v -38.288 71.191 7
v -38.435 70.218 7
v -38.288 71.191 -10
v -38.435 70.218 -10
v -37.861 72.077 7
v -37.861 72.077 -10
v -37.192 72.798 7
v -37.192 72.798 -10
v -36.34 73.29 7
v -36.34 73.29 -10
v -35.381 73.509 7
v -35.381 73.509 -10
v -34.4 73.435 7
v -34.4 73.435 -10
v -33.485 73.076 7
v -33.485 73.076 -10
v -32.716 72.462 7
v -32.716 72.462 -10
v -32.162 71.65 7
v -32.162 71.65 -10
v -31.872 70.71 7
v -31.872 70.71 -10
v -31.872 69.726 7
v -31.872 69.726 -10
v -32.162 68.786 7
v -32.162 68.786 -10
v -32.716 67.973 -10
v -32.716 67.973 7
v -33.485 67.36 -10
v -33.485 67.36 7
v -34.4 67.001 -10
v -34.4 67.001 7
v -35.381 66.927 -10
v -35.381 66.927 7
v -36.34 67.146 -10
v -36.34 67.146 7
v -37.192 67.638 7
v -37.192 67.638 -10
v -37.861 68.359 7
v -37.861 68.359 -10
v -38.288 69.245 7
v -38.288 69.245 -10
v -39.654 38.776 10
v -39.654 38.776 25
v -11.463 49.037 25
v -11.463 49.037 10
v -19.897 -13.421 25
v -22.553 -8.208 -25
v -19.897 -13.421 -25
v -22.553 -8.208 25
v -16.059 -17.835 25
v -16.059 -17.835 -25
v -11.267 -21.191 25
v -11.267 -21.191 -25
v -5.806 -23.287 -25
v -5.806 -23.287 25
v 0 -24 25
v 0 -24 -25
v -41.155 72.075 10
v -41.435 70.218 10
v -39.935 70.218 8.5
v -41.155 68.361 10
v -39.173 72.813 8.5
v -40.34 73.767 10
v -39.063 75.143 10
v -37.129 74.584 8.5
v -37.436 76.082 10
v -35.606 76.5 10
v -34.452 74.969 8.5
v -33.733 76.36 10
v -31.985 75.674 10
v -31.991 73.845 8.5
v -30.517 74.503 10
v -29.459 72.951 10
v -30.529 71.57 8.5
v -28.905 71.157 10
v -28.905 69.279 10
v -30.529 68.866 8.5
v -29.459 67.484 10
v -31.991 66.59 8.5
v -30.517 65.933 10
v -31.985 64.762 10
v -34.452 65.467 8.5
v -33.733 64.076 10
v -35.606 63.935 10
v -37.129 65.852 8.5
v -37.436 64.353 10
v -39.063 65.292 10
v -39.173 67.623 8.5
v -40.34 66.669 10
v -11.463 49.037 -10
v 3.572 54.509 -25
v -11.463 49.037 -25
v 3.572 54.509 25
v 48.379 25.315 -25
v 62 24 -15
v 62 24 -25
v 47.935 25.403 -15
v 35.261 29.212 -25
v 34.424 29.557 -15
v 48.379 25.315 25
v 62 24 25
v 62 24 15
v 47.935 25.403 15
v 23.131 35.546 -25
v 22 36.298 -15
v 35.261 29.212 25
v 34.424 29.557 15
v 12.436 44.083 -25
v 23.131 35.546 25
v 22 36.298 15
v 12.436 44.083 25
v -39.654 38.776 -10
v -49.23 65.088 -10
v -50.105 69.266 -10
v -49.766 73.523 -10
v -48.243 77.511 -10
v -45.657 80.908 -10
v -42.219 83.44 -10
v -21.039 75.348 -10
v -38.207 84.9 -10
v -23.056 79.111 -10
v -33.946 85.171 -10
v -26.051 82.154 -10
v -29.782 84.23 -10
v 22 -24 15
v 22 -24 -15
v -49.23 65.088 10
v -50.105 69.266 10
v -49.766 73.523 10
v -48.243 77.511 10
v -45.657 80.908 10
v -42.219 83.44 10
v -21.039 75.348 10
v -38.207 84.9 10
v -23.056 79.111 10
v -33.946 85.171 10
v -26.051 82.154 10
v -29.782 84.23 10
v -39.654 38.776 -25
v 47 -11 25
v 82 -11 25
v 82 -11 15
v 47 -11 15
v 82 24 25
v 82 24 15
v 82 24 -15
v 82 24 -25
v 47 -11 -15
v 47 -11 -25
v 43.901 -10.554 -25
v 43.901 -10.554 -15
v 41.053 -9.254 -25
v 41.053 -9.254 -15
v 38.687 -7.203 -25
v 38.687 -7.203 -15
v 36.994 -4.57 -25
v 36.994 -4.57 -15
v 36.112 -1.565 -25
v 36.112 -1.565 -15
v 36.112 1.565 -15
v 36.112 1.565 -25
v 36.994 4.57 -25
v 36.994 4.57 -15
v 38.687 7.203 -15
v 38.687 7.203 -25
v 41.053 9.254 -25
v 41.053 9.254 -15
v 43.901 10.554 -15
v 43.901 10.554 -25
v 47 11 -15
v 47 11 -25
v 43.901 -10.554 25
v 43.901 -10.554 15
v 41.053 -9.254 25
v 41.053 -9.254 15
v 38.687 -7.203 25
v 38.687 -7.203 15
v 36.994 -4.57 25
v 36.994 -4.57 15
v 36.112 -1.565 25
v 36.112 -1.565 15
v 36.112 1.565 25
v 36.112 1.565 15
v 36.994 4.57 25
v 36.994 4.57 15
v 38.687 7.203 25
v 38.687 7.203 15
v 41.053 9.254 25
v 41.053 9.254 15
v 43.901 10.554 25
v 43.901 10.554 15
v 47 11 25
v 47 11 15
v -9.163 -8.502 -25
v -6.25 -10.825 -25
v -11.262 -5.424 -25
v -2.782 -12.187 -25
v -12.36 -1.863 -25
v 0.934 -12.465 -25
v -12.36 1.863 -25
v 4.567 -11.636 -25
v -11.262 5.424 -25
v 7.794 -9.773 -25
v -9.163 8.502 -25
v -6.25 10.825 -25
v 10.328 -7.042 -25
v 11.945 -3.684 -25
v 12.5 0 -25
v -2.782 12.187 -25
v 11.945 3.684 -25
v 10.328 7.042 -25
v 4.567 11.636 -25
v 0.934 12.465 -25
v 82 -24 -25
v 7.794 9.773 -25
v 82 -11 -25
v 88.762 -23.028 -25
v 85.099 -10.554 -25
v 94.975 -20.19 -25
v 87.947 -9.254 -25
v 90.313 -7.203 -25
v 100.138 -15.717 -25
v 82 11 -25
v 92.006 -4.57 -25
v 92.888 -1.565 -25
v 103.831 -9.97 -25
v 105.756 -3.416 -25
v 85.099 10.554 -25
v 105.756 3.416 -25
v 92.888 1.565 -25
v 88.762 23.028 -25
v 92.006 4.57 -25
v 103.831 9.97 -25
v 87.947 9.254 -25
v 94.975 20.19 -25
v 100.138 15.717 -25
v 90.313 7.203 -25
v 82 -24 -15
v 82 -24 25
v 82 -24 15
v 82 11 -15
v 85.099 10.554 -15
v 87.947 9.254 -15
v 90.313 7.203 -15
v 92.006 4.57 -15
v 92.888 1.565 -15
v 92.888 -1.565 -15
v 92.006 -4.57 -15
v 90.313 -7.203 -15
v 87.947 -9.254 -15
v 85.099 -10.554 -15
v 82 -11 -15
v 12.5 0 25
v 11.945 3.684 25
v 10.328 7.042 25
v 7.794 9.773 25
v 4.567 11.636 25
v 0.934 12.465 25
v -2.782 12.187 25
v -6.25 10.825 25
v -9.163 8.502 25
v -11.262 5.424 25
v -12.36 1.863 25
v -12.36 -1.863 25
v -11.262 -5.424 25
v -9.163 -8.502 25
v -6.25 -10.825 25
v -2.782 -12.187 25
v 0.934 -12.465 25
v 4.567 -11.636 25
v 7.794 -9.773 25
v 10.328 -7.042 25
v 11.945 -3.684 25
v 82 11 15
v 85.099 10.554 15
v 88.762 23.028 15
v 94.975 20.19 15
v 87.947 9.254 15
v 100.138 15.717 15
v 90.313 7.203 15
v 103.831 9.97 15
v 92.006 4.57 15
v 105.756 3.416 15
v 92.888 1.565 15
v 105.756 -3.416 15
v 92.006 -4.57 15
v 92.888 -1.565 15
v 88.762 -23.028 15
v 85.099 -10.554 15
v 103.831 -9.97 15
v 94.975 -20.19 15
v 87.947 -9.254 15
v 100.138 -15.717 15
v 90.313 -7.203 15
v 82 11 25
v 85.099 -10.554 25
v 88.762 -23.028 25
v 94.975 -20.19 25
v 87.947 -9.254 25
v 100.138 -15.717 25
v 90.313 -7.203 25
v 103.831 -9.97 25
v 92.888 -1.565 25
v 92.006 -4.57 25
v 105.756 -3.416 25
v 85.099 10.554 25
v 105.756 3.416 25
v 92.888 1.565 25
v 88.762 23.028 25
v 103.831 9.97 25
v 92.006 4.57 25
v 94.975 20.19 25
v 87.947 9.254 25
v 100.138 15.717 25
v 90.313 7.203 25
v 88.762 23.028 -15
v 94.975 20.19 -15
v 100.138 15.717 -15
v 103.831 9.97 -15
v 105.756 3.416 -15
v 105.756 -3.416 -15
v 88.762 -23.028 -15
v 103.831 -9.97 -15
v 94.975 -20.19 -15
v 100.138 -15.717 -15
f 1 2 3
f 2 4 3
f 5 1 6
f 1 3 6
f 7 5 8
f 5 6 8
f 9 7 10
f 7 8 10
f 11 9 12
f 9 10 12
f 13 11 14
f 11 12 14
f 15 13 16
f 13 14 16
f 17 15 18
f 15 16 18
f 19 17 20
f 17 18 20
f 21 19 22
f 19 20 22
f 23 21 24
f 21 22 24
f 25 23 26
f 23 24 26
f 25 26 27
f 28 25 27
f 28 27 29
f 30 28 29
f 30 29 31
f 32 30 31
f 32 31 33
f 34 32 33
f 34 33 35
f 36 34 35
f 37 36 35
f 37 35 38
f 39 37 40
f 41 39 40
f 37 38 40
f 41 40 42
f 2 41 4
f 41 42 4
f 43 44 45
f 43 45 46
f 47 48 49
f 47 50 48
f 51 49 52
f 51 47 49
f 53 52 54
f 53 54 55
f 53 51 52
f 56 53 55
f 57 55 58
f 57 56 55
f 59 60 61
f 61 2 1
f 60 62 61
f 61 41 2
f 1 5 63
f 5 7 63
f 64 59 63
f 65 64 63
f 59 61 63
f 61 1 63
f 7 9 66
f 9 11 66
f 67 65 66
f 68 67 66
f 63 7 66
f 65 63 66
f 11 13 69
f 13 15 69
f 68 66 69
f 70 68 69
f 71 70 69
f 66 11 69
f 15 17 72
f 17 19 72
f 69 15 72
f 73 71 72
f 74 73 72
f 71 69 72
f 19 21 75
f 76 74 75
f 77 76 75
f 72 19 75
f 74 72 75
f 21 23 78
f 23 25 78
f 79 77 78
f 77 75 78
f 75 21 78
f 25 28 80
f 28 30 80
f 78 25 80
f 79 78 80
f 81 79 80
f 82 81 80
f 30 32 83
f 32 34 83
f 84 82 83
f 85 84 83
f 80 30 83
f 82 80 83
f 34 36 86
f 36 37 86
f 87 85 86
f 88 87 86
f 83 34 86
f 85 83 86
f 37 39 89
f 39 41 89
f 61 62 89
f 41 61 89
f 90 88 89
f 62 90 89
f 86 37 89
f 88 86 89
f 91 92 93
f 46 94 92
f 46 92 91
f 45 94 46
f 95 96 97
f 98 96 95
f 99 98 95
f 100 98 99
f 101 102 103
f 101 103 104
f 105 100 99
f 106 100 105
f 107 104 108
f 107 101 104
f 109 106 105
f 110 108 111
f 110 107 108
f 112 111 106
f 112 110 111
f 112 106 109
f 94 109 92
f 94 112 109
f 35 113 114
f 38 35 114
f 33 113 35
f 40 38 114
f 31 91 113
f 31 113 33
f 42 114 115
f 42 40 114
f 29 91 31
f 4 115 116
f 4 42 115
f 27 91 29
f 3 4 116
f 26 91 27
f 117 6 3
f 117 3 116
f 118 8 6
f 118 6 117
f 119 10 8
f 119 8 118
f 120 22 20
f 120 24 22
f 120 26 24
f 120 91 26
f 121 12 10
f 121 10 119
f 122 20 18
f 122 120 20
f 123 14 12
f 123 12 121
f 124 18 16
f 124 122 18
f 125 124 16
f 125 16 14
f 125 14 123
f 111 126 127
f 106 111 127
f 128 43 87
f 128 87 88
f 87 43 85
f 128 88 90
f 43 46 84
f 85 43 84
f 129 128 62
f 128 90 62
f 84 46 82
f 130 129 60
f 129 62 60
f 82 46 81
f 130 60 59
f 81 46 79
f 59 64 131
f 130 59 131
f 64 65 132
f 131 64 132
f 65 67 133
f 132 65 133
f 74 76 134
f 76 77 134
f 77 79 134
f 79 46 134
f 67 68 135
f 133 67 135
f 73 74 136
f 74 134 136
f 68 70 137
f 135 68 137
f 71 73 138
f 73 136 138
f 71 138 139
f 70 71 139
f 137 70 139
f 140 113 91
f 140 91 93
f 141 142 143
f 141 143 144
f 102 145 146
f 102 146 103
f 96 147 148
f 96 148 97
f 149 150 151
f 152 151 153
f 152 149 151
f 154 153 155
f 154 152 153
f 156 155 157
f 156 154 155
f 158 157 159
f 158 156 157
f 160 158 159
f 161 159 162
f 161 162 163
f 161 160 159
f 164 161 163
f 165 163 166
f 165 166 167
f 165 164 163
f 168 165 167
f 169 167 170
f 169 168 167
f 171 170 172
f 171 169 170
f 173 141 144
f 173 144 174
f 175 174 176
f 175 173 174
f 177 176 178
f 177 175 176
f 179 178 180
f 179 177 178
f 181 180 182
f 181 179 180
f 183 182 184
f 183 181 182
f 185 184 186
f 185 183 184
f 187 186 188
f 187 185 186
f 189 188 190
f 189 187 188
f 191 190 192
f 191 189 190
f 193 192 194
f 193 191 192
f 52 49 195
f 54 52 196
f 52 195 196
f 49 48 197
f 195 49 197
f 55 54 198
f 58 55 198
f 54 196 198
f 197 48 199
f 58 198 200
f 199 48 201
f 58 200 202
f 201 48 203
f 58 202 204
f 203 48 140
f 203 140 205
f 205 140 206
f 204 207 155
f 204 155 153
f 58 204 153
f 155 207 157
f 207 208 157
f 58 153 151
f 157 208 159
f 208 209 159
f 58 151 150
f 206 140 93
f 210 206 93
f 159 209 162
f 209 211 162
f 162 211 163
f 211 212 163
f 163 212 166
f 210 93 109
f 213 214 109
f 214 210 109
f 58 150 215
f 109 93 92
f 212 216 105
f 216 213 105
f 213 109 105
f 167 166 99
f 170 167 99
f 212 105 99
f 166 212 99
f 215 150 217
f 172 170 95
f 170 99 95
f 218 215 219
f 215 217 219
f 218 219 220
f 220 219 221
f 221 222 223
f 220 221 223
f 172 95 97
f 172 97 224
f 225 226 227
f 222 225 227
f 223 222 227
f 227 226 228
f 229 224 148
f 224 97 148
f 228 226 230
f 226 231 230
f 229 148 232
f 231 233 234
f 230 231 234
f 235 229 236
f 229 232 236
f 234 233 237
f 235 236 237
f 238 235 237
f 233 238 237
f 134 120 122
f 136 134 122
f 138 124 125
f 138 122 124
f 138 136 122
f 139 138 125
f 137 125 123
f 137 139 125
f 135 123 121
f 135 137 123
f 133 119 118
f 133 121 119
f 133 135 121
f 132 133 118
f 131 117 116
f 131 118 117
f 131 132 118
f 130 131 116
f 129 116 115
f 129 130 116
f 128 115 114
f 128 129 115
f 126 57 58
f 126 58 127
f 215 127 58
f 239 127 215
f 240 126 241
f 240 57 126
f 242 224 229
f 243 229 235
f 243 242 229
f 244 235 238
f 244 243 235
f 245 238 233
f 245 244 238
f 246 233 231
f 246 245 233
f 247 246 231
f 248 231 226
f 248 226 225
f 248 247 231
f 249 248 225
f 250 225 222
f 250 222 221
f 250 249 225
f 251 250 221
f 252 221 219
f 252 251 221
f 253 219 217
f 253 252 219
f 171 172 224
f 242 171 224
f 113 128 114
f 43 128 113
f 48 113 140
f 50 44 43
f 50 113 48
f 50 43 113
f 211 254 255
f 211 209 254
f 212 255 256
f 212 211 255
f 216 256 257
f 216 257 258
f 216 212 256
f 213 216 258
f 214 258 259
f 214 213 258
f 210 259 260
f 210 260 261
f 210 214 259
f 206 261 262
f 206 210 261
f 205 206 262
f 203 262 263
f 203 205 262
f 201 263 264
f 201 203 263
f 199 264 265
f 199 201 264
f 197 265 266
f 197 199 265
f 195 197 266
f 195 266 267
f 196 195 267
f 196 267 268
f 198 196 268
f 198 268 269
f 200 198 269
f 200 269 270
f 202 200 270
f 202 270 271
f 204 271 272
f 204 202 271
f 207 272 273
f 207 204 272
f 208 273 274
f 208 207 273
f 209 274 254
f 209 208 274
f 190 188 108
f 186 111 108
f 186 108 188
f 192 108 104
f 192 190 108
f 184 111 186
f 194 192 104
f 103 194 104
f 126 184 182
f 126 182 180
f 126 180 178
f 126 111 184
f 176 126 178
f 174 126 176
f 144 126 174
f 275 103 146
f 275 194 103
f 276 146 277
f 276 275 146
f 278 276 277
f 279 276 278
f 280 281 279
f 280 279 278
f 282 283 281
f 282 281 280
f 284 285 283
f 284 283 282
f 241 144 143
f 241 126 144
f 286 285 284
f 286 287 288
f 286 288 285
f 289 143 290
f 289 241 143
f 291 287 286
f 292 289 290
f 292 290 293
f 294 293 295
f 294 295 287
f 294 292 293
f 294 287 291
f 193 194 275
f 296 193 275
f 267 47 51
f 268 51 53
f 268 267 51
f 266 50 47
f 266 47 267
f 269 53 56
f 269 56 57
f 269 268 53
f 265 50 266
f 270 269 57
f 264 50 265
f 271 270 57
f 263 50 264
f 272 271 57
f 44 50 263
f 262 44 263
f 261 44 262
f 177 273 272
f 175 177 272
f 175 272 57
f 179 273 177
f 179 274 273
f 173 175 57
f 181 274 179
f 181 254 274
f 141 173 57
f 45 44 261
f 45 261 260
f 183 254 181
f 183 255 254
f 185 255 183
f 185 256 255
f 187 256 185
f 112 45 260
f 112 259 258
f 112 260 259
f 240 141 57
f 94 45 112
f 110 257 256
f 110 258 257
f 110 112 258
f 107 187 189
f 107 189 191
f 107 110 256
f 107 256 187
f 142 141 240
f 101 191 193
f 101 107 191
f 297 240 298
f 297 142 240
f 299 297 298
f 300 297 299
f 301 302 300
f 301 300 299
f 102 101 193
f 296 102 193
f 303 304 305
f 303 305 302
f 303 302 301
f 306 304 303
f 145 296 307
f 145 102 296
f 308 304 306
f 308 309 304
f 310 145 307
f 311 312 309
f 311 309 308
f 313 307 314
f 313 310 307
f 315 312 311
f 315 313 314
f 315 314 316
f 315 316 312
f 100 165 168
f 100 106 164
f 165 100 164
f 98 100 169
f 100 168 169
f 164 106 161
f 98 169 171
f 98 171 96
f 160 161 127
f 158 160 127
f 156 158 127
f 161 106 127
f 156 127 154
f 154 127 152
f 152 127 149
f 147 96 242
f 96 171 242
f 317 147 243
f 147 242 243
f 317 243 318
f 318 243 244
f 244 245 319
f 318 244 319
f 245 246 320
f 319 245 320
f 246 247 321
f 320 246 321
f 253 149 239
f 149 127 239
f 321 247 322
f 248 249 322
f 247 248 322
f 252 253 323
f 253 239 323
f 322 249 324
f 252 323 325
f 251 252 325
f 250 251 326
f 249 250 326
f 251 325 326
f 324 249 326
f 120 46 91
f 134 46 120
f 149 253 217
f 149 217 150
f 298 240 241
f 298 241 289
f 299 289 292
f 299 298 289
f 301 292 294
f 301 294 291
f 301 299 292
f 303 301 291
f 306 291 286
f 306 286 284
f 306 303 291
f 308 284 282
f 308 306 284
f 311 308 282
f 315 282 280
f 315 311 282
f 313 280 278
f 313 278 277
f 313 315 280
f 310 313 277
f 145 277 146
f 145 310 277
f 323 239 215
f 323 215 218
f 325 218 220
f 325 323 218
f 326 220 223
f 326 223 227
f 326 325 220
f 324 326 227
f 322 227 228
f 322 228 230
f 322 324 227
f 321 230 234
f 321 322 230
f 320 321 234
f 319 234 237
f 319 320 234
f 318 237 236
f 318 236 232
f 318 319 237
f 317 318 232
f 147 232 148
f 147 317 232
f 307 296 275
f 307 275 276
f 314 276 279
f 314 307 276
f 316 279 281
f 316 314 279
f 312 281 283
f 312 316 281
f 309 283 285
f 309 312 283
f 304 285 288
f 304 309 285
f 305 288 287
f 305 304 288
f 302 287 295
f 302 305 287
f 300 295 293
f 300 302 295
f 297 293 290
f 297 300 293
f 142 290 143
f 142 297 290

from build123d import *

# Parameters (mm, degrees)
SKETCH1_R                                       = 12.5
SKETCH1_R_2                                     = 3
BOSS_EXTRUDE1_DEPTH                             = 25
SKETCH2_W                                       = 15
SKETCH2_H                                       = 43
CUT_EXTRUDE1_DEPTH                              = 50
CUT_EXTRUDE2_DEPTH                              = 125.934480099
CUT_EXTRUDE2_DEPTH_BACK                         = 125.934480099
SKETCH4_W                                       = 100
SKETCH4_H                                       = 30
CSK_FOR_M6_FLAT_HEAD_MACHINE_SCREW1_D           = 6.6
CSK_FOR_M6_FLAT_HEAD_MACHINE_SCREW1_CSINK_D     = 12.6
CSK_FOR_M6_FLAT_HEAD_MACHINE_SCREW1_CSINK_ANGLE = 90


with BuildPart() as part:
    # Sketch1 → Boss-Extrude1 (new, symmetric)
    with BuildSketch(Plane.XY):
        with BuildLine():
            Line((0, -24), (82, -24))
            ThreePointArc((82, -24), (106, 0), (82, 24))
            Line((82, 24), (62, 24))
            ThreePointArc((62, 24), (29.043180304, 32.086461832), (3.572230491, 54.509074192))
            Line((3.572230491, 54.509074192), (-11.462851442, 49.036751899))
            Line((-11.462851442, 49.036751899), (-21.039415455, 75.348145281))
            ThreePointArc((-21.039415455, 75.348145281), (-40.265106916, 84.313232443), (-49.230194078, 65.087540981))
            Line((-49.230194078, 65.087540981), (-39.653630065, 38.776147599))
            Line((-39.653630065, 38.776147599), (-22.552622899, -8.20848344))
            ThreePointArc((-22.552622899, -8.20848344), (-13.765834472, -19.659649063), (0, -24))
        make_face()
        Circle(SKETCH1_R, mode=Mode.SUBTRACT)
        with Locations((-35.134804766, 70.217843131)):
            Circle(SKETCH1_R_2, mode=Mode.SUBTRACT)
        with BuildLine():
            Line((47, 11), (82, 11))
            ThreePointArc((82, 11), (93, 0), (82, -11))
            Line((82, -11), (47, -11))
            ThreePointArc((47, -11), (36, 0), (47, 11))
        make_face(mode=Mode.SUBTRACT)
    extrude(amount=BOSS_EXTRUDE1_DEPTH, both=True)

    # Sketch2 → Cut-Extrude1 (cut)
    with BuildSketch(Plane(origin=(5.638155725, 2.05212086, 0), x_dir=(0, 0, -1), z_dir=(0.9396926207859104, 0.3420201433256632, 0))):
        with Locations((-17.5, 71.5)):
            Rectangle(SKETCH2_W, SKETCH2_H)
        with Locations((17.5, 71.5)):
            Rectangle(SKETCH2_W, SKETCH2_H)
    extrude(amount=-CUT_EXTRUDE1_DEPTH, mode=Mode.SUBTRACT)

    # Sketch4 → Cut-Extrude2 (cut, two sides: drawn at the far end of the back side and taken through both)
    with BuildSketch(Plane(origin=(0, 24, 0), x_dir=(1, 0, 0), z_dir=(0, 1, 0)).offset(-CUT_EXTRUDE2_DEPTH_BACK)):
        with Locations((72, 0)):
            Rectangle(SKETCH4_W, SKETCH4_H)
    extrude(amount=CUT_EXTRUDE2_DEPTH + CUT_EXTRUDE2_DEPTH_BACK, mode=Mode.SUBTRACT)

    # CSK for M6 Flat Head Machine Screw1 (through all)
    with Locations(Plane.XY.offset(10)):
        with Locations((-35.134804766, 70.217843131)):
            CounterSinkHole(CSK_FOR_M6_FLAT_HEAD_MACHINE_SCREW1_D / 2, CSK_FOR_M6_FLAT_HEAD_MACHINE_SCREW1_CSINK_D / 2, counter_sink_angle=CSK_FOR_M6_FLAT_HEAD_MACHINE_SCREW1_CSINK_ANGLE)


solid = part.part
